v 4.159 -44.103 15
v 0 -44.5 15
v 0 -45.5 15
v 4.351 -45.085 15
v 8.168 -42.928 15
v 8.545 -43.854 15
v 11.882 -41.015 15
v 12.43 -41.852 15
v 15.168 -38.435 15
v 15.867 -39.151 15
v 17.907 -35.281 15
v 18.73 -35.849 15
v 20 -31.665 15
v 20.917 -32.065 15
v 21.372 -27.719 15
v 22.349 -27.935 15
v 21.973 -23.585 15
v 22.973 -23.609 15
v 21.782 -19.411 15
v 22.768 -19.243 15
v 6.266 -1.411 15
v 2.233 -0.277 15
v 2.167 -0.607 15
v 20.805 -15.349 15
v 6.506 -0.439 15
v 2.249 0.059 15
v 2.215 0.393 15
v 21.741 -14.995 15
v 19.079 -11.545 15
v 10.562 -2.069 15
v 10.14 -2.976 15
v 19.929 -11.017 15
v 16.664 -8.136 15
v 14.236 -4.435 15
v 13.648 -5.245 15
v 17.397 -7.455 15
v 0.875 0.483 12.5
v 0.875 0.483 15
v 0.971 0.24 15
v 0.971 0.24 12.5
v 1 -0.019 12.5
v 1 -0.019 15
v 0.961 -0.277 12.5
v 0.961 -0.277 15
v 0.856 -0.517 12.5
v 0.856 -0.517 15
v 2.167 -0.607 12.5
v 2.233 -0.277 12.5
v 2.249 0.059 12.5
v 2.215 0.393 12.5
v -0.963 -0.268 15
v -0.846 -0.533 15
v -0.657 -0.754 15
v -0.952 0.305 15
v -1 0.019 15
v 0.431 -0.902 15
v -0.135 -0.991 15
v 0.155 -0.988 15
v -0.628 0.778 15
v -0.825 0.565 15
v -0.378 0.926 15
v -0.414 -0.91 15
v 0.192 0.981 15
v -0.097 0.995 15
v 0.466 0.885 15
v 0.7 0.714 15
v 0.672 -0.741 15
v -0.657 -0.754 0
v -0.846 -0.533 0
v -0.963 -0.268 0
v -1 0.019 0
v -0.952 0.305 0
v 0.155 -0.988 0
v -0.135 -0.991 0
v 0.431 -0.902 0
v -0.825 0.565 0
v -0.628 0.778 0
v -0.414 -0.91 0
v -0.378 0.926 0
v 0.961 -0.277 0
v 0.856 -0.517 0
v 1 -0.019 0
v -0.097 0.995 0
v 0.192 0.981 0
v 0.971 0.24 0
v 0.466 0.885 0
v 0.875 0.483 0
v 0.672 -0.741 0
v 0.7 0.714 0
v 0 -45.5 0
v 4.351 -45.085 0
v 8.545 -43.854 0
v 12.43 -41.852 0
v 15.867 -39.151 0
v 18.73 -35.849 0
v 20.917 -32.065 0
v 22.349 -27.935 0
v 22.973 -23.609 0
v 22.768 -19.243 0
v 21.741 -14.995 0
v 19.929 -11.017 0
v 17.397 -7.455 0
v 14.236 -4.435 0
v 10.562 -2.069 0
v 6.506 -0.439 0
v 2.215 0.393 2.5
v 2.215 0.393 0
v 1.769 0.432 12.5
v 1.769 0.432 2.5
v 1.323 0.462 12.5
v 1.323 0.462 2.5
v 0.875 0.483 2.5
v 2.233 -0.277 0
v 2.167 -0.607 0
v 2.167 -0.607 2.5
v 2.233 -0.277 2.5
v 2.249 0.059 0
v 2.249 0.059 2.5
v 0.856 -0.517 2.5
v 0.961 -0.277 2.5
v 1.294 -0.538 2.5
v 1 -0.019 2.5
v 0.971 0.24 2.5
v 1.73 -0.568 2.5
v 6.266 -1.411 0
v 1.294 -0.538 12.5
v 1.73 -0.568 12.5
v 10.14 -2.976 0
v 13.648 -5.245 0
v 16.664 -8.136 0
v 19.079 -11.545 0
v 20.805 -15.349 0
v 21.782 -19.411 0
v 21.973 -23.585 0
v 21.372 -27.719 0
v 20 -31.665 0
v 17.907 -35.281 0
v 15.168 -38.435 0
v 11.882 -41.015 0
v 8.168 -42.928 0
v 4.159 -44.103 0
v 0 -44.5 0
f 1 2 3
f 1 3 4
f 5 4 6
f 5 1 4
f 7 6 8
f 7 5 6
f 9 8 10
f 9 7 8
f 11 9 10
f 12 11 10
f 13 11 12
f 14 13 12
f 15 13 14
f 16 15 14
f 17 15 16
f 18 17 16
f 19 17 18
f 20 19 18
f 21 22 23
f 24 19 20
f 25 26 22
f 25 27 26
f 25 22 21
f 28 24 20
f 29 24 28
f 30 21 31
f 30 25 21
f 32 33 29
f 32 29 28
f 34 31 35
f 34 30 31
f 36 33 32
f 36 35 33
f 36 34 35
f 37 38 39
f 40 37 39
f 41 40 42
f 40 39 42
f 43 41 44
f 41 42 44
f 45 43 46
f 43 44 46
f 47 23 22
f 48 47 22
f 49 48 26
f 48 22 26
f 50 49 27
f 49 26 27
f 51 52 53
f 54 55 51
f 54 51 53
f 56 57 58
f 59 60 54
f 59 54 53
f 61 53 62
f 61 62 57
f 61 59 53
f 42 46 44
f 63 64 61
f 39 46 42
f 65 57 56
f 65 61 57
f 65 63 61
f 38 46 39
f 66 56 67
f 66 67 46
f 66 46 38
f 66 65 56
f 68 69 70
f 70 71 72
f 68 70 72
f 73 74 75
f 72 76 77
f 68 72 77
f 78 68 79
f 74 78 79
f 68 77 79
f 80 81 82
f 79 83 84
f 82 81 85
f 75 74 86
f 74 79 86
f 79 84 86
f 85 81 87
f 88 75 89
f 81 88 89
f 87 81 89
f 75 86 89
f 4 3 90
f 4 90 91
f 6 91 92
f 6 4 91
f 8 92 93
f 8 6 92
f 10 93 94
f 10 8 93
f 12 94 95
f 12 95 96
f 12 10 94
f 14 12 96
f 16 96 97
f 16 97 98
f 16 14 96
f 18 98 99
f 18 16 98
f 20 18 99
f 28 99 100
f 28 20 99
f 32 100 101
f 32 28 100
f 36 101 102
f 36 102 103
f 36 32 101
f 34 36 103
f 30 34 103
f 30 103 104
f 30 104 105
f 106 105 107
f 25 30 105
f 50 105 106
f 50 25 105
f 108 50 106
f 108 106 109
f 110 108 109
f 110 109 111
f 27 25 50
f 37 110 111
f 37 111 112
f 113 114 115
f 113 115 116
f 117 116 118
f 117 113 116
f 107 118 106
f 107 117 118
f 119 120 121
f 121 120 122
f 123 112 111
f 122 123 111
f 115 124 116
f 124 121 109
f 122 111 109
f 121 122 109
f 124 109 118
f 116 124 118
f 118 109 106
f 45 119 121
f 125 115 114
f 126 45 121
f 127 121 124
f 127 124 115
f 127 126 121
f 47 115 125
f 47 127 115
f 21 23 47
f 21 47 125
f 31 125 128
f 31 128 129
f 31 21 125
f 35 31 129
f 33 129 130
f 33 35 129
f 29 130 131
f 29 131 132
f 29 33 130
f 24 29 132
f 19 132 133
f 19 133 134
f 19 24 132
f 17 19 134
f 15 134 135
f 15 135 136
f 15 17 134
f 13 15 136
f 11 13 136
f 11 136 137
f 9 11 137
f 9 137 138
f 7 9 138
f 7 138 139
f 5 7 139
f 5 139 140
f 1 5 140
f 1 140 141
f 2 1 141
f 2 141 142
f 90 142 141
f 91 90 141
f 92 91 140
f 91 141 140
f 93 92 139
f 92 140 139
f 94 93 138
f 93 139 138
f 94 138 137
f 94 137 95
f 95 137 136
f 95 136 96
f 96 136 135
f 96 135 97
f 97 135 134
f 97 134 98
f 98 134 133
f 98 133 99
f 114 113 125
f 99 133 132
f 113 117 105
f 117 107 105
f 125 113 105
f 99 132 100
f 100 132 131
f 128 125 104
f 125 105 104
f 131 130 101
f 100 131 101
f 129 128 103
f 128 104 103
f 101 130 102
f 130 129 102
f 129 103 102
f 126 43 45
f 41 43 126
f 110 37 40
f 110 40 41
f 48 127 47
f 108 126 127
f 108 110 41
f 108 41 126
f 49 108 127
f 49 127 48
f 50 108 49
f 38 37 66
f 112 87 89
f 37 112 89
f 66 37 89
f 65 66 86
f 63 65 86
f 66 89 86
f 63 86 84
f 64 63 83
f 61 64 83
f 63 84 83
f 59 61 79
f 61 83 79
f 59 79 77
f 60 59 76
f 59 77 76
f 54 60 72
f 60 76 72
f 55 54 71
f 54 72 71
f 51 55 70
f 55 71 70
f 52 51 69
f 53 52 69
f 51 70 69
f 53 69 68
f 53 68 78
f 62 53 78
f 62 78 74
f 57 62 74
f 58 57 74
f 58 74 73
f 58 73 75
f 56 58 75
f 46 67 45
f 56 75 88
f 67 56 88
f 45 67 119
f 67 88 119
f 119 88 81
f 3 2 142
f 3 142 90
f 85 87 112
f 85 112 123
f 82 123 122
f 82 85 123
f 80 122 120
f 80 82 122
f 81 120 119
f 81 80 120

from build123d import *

# Parameters (mm, degrees)
SKETCH_1_R          = 1
EXTRUDE_1_DEPTH     = 15
EXTRUDE_2_DEPTH     = 15
CUT_EXTRUDE_1_DEPTH = 2.5
CUT_EXTRUDE_2_DEPTH = 2.5


with BuildPart() as part:
    # ｽｹｯﾁ1 → ﾎﾞｽ - 押し出し1 (new body)
    with BuildSketch(Plane.XY):
        Circle(SKETCH_1_R)
    extrude(amount=EXTRUDE_1_DEPTH)

    # ｽｹｯﾁ2 → ﾎﾞｽ - 押し出し2 (add)
    with BuildSketch(Plane.XY.offset(15)):
        with BuildLine():
            Line((0, -44.5), (0, -45.5))
            ThreePointArc((0, -45.5), (23, -22.5), (0, 0.5))
            Line((0, 0.5), (0, -0.5))
            ThreePointArc((0, -0.5), (22, -22.5), (0, -44.5))
        make_face()
    extrude(amount=-EXTRUDE_2_DEPTH)

    # ｽｹｯﾁ3 → ｶｯﾄ - 押し出し1 (cut)
    with BuildSketch(Plane.XY.offset(15)):
        with BuildLine():
            ThreePointArc((0.875436399, 0.483333333), (0.999814775, -0.019246198), (0.856186636, -0.516666667))
            ThreePointArc((0.856186636, -0.516666667), (1.51206294, -0.552023654), (2.166591434, -0.606944444))
            ThreePointArc((2.166591434, -0.606944444), (2.247324467, -0.109693843), (2.215402295, 0.393055556))
            ThreePointArc((2.215402295, 0.393055556), (1.546078419, 0.44797685), (0.875436399, 0.483333333))
        make_face()
    extrude(amount=-CUT_EXTRUDE_1_DEPTH, mode=Mode.SUBTRACT)

    # ｽｹｯﾁ4 → ｶｯﾄ - 押し出し2 (cut)
    with BuildSketch(Plane(origin=(0, 0, 0), x_dir=(-1, 0, 0), z_dir=(0, 0, -1))):
        with BuildLine():
            ThreePointArc((-0.875436399, 0.483333333), (-0.999814775, -0.019246198), (-0.856186636, -0.516666667))
            ThreePointArc((-0.856186636, -0.516666667), (-1.51206294, -0.552023654), (-2.166591434, -0.606944444))
            ThreePointArc((-2.166591434, -0.606944444), (-2.247324467, -0.109693843), (-2.215402295, 0.393055556))
            ThreePointArc((-2.215402295, 0.393055556), (-1.546078419, 0.44797685), (-0.875436399, 0.483333333))
        make_face()
    extrude(amount=-CUT_EXTRUDE_2_DEPTH, mode=Mode.SUBTRACT)


solid = part.part
